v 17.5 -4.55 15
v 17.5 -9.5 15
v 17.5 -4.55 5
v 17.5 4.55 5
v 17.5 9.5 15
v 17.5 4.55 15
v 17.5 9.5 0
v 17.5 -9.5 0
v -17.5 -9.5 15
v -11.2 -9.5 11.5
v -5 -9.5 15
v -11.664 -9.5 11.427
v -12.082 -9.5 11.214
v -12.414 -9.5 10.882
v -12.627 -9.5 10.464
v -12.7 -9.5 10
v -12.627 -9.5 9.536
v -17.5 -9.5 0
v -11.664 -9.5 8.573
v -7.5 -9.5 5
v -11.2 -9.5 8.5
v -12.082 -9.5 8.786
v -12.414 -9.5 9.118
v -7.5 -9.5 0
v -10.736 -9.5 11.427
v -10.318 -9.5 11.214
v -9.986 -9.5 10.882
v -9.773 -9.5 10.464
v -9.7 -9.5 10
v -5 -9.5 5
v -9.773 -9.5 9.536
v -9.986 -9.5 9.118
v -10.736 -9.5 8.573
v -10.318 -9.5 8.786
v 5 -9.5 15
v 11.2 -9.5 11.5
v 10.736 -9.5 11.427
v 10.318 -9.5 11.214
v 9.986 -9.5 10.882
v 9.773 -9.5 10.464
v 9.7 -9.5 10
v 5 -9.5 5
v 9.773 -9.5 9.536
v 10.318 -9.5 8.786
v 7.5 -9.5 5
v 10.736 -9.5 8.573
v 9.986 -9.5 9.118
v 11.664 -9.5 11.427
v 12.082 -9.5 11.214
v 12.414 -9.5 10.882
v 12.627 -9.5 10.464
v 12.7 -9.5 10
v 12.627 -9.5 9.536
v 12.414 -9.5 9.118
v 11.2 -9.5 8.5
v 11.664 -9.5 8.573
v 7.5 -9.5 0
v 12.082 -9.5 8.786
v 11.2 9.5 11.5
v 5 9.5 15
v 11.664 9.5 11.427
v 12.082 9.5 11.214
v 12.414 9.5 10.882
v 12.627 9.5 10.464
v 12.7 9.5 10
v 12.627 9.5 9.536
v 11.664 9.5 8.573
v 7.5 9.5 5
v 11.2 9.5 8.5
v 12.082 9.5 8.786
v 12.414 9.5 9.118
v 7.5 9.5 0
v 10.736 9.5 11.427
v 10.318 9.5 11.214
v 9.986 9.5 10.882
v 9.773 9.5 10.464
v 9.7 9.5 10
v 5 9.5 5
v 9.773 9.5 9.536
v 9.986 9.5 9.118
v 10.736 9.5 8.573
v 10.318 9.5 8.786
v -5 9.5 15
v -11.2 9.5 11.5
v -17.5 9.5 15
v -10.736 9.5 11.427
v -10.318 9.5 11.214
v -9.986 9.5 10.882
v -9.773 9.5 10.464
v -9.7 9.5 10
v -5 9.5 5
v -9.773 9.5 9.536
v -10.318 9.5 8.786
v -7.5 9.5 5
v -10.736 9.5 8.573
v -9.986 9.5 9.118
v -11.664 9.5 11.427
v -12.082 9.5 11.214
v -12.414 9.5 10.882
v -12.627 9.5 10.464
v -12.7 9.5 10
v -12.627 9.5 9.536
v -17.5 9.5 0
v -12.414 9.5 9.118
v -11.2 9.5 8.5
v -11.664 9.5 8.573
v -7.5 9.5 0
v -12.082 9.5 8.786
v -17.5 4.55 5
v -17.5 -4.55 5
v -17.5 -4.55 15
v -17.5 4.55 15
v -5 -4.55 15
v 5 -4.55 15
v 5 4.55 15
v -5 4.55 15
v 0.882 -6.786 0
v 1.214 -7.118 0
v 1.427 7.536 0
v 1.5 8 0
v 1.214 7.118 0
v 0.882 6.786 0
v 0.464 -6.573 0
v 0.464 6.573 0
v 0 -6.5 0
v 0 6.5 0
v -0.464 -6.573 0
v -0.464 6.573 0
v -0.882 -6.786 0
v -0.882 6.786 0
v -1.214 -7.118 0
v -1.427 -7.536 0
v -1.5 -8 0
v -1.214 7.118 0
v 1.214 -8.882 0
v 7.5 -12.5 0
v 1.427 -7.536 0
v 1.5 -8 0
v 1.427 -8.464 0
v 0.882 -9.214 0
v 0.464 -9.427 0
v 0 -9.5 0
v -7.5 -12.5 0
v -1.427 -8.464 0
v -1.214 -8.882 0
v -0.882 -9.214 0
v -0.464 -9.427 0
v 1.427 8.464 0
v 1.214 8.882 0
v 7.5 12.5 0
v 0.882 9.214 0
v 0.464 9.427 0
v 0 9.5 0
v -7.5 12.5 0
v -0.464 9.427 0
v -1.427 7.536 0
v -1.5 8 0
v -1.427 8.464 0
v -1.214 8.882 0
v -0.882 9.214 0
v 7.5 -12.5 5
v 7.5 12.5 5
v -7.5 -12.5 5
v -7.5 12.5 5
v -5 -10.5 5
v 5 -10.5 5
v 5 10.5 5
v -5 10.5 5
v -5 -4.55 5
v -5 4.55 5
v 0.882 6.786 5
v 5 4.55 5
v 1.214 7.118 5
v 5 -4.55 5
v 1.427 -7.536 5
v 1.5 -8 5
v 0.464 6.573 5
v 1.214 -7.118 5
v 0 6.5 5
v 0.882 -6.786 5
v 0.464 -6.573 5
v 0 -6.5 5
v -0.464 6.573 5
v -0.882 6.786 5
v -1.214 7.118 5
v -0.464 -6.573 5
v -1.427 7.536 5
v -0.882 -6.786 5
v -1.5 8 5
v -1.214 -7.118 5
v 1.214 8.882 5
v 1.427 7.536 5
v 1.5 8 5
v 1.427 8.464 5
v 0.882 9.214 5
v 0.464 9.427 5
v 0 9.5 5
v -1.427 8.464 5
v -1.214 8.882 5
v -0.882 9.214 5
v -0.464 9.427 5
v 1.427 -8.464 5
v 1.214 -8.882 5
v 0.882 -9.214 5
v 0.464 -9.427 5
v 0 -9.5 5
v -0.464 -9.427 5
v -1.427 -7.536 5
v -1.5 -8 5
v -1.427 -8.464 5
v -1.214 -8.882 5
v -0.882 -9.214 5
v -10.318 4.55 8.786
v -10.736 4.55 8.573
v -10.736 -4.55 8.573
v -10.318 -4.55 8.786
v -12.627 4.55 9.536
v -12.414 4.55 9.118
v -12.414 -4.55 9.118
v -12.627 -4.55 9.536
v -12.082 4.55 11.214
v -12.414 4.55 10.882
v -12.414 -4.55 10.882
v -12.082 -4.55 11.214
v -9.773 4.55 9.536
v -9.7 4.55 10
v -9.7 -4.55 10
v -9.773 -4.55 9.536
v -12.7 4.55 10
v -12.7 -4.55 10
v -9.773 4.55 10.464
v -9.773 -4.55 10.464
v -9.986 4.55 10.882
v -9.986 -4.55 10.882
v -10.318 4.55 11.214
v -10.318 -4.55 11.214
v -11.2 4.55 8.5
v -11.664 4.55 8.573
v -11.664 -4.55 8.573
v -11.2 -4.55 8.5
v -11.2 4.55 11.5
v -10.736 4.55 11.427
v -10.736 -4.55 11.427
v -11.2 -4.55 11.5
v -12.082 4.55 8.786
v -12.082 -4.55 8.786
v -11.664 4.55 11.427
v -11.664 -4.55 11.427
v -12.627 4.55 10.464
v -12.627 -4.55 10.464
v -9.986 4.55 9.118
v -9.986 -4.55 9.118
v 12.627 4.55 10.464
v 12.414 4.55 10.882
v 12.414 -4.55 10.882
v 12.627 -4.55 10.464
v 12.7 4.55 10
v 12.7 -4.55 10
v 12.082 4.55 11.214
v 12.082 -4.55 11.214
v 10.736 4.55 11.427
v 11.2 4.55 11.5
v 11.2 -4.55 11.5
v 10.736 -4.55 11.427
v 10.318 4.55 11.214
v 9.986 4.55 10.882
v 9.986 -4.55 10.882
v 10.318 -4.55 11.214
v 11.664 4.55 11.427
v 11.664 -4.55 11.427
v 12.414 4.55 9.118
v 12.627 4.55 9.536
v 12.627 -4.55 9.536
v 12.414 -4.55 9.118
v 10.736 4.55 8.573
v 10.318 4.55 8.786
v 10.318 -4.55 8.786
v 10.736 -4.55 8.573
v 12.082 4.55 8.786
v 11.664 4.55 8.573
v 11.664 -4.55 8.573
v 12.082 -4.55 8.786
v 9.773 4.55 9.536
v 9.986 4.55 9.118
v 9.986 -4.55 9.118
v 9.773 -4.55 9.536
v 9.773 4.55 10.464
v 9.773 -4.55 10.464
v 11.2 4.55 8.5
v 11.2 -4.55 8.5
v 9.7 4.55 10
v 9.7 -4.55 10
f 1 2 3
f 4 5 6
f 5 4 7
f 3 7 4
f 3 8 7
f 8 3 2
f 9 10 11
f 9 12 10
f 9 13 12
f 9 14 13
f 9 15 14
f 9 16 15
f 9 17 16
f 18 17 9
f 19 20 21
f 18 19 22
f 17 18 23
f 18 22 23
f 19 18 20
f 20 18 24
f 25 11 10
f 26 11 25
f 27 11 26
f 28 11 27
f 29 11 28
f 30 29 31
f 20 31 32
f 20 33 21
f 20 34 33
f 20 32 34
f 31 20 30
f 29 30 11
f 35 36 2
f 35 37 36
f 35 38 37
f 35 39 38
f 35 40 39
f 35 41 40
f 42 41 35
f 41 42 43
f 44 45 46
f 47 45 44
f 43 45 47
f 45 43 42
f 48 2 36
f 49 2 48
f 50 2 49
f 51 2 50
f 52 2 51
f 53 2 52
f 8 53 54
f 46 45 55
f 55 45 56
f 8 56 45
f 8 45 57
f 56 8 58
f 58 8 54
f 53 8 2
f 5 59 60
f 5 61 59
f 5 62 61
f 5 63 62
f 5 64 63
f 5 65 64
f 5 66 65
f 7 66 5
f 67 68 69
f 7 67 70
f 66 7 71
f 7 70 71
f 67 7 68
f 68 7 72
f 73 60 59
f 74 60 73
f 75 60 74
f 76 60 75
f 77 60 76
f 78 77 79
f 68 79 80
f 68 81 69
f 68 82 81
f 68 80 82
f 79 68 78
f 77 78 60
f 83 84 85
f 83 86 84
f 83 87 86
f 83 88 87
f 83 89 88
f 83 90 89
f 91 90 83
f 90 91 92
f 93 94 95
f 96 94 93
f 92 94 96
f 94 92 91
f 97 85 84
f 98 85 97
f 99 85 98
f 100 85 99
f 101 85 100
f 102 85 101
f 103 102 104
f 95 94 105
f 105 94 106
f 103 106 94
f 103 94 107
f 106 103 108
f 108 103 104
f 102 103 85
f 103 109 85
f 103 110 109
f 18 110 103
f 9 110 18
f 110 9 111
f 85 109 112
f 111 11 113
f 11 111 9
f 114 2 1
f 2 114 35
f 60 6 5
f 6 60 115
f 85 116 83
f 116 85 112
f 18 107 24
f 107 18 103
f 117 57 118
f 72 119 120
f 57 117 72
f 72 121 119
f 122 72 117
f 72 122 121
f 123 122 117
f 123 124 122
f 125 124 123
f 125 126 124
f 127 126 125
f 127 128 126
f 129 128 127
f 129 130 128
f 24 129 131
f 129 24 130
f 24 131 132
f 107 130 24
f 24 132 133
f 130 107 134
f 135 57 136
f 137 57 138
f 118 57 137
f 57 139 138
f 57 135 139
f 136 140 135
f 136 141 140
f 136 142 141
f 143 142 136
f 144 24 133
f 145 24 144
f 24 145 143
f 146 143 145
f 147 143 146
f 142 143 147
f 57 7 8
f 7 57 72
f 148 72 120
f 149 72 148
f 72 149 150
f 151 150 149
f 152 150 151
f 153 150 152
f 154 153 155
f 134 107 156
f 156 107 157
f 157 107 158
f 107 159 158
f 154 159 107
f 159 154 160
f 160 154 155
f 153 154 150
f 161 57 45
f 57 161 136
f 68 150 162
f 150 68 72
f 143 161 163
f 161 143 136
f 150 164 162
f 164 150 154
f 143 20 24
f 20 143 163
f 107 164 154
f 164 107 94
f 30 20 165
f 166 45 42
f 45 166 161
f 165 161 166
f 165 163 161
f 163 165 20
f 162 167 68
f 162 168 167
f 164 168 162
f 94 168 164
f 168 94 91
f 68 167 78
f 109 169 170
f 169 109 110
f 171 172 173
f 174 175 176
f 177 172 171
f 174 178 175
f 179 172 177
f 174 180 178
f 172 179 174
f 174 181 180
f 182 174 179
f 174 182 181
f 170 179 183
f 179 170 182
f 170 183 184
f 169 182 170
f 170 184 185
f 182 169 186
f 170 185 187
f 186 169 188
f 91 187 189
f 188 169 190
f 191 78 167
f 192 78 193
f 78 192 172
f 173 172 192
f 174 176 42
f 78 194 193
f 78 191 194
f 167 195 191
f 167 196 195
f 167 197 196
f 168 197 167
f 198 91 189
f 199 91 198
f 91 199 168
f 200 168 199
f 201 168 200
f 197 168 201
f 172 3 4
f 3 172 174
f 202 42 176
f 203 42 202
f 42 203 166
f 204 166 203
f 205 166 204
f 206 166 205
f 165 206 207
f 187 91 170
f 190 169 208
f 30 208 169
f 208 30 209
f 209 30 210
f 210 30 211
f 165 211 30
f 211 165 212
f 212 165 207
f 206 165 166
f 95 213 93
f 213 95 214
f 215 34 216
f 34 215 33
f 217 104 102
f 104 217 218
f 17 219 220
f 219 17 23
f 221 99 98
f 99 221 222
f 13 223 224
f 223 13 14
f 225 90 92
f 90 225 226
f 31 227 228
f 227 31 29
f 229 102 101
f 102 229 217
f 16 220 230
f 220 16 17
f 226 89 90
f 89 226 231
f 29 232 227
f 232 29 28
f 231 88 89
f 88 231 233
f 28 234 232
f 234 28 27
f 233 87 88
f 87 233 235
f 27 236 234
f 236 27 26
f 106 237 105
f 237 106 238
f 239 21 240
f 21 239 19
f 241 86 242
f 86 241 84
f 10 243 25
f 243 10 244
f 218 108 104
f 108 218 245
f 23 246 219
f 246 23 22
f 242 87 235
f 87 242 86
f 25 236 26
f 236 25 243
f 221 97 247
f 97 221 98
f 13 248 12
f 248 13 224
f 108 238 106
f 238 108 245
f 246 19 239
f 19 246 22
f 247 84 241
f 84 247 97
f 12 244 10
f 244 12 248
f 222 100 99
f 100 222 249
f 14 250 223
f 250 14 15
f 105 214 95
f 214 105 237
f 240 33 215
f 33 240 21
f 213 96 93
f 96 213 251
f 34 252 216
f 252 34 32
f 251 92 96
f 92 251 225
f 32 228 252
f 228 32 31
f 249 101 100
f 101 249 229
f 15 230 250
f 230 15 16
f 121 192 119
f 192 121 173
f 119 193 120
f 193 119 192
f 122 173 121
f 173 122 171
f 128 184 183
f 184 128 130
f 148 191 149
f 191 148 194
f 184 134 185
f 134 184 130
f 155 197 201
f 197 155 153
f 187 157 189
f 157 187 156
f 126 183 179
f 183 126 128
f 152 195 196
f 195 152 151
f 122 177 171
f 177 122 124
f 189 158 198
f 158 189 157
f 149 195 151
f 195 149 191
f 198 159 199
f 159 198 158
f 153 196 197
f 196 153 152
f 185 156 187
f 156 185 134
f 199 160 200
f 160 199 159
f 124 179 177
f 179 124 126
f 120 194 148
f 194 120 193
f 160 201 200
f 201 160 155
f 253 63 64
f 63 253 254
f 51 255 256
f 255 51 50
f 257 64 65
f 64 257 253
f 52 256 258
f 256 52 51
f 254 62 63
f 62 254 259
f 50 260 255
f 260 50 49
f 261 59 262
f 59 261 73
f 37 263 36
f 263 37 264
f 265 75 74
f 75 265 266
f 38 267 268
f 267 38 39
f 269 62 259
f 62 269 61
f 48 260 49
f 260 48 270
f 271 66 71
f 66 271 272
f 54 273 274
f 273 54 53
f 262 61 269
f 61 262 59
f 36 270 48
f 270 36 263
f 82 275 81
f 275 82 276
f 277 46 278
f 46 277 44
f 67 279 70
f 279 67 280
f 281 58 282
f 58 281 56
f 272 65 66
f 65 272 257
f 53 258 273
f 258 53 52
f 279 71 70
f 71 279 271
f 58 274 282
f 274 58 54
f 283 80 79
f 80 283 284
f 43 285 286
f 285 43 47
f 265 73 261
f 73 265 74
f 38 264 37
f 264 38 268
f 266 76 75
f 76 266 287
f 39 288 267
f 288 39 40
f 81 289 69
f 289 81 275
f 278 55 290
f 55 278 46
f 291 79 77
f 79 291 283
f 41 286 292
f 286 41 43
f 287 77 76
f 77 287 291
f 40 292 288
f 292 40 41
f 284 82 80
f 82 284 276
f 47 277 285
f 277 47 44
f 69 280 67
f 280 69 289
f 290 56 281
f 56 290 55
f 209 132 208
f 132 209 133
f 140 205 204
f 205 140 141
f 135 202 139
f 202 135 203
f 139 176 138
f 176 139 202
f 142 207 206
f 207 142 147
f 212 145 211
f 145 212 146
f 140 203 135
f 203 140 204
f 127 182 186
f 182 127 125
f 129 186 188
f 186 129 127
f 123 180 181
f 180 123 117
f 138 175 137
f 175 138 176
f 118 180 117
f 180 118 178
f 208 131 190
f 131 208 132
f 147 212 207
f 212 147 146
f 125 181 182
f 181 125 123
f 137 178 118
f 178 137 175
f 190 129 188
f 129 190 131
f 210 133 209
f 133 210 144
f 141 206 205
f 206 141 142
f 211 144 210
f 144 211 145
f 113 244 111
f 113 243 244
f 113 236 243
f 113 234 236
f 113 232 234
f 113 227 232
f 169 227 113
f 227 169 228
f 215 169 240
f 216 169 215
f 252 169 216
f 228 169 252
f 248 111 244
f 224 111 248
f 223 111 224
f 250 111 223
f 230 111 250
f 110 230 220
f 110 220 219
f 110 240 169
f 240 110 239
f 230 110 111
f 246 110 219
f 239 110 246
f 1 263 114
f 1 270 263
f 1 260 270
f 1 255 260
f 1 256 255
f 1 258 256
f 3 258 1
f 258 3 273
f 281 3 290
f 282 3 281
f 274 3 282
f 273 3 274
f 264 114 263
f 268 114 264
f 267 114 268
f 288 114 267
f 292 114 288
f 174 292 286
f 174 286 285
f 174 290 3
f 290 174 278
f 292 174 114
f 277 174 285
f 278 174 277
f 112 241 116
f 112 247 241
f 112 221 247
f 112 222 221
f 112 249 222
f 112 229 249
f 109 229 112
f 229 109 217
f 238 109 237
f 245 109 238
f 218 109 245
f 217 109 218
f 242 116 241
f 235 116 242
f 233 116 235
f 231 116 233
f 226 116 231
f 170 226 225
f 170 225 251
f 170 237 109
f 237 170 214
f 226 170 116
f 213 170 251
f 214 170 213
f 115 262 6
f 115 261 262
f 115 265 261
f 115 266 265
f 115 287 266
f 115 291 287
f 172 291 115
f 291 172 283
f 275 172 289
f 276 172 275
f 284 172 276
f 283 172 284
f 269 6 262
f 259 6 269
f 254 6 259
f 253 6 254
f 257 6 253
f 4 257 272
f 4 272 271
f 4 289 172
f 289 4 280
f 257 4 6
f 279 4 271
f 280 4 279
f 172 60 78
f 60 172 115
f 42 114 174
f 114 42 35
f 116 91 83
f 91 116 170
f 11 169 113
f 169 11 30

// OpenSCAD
// % translate([0,50/2,0]) cube([100,50,9], center=true);

rotate([90,0,0])
translate([0,15/2,0]) difference() {
    union() {
        cube([35,15,9+(5*2)], center=true);
        translate([0,-5,0]) cube([15,5,9+(5*2)+(3*2)], center=true);
    }
    translate([0,5,0]) cube([35+2,15,9.1], center=true);
    for (i=[-1,1]) {
        translate([i*11.2,2.5,0]) cylinder(d=3, h=25, $fn=20, center=true);
        translate([0,2.5,i*8]) rotate([90,0,0]) cylinder(d=3, h=25, $fn=20, center=true);
    }
    translate([0,5,0]) cube([10,5+10,9+(5*2)+2], center=true);

}
